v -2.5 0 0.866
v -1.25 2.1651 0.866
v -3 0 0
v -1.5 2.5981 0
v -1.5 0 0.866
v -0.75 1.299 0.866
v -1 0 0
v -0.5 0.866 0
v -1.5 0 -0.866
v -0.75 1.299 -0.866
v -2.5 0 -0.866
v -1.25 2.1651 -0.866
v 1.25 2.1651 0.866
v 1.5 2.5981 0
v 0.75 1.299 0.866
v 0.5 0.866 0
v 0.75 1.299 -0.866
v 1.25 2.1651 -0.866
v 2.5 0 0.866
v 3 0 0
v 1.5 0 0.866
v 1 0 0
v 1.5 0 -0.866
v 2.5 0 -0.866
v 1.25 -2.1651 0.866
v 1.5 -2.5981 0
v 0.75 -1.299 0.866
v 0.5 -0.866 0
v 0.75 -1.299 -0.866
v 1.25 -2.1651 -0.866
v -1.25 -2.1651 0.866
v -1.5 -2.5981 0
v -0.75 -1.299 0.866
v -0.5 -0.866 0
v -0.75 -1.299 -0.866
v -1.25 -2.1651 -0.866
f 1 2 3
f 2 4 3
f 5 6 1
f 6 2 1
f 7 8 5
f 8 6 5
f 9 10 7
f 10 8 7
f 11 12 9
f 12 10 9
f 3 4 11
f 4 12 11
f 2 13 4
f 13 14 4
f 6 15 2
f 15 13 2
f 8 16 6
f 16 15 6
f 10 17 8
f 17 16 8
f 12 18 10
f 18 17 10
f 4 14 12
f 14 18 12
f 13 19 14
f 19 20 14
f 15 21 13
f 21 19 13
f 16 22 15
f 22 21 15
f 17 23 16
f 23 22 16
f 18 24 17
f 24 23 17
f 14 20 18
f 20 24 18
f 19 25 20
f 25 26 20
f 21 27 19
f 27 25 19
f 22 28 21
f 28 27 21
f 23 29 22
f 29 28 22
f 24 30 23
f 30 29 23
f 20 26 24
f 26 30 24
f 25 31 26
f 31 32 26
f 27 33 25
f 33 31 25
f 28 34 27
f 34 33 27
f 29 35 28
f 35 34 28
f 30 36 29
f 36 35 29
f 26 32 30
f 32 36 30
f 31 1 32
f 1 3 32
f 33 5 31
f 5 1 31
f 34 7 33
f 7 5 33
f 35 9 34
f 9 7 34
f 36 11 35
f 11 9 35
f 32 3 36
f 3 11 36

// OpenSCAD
echo(version=version());

// rotate_extrude() rotates a 2D shape around the Z axis. 
// Note that the 2D shape must be either completely on the 
// positive or negative side of the X axis.
color("red")
rotate_extrude(convexity = 10, $fn = 6)
translate([2, 0, 0])
circle(r = 1);
